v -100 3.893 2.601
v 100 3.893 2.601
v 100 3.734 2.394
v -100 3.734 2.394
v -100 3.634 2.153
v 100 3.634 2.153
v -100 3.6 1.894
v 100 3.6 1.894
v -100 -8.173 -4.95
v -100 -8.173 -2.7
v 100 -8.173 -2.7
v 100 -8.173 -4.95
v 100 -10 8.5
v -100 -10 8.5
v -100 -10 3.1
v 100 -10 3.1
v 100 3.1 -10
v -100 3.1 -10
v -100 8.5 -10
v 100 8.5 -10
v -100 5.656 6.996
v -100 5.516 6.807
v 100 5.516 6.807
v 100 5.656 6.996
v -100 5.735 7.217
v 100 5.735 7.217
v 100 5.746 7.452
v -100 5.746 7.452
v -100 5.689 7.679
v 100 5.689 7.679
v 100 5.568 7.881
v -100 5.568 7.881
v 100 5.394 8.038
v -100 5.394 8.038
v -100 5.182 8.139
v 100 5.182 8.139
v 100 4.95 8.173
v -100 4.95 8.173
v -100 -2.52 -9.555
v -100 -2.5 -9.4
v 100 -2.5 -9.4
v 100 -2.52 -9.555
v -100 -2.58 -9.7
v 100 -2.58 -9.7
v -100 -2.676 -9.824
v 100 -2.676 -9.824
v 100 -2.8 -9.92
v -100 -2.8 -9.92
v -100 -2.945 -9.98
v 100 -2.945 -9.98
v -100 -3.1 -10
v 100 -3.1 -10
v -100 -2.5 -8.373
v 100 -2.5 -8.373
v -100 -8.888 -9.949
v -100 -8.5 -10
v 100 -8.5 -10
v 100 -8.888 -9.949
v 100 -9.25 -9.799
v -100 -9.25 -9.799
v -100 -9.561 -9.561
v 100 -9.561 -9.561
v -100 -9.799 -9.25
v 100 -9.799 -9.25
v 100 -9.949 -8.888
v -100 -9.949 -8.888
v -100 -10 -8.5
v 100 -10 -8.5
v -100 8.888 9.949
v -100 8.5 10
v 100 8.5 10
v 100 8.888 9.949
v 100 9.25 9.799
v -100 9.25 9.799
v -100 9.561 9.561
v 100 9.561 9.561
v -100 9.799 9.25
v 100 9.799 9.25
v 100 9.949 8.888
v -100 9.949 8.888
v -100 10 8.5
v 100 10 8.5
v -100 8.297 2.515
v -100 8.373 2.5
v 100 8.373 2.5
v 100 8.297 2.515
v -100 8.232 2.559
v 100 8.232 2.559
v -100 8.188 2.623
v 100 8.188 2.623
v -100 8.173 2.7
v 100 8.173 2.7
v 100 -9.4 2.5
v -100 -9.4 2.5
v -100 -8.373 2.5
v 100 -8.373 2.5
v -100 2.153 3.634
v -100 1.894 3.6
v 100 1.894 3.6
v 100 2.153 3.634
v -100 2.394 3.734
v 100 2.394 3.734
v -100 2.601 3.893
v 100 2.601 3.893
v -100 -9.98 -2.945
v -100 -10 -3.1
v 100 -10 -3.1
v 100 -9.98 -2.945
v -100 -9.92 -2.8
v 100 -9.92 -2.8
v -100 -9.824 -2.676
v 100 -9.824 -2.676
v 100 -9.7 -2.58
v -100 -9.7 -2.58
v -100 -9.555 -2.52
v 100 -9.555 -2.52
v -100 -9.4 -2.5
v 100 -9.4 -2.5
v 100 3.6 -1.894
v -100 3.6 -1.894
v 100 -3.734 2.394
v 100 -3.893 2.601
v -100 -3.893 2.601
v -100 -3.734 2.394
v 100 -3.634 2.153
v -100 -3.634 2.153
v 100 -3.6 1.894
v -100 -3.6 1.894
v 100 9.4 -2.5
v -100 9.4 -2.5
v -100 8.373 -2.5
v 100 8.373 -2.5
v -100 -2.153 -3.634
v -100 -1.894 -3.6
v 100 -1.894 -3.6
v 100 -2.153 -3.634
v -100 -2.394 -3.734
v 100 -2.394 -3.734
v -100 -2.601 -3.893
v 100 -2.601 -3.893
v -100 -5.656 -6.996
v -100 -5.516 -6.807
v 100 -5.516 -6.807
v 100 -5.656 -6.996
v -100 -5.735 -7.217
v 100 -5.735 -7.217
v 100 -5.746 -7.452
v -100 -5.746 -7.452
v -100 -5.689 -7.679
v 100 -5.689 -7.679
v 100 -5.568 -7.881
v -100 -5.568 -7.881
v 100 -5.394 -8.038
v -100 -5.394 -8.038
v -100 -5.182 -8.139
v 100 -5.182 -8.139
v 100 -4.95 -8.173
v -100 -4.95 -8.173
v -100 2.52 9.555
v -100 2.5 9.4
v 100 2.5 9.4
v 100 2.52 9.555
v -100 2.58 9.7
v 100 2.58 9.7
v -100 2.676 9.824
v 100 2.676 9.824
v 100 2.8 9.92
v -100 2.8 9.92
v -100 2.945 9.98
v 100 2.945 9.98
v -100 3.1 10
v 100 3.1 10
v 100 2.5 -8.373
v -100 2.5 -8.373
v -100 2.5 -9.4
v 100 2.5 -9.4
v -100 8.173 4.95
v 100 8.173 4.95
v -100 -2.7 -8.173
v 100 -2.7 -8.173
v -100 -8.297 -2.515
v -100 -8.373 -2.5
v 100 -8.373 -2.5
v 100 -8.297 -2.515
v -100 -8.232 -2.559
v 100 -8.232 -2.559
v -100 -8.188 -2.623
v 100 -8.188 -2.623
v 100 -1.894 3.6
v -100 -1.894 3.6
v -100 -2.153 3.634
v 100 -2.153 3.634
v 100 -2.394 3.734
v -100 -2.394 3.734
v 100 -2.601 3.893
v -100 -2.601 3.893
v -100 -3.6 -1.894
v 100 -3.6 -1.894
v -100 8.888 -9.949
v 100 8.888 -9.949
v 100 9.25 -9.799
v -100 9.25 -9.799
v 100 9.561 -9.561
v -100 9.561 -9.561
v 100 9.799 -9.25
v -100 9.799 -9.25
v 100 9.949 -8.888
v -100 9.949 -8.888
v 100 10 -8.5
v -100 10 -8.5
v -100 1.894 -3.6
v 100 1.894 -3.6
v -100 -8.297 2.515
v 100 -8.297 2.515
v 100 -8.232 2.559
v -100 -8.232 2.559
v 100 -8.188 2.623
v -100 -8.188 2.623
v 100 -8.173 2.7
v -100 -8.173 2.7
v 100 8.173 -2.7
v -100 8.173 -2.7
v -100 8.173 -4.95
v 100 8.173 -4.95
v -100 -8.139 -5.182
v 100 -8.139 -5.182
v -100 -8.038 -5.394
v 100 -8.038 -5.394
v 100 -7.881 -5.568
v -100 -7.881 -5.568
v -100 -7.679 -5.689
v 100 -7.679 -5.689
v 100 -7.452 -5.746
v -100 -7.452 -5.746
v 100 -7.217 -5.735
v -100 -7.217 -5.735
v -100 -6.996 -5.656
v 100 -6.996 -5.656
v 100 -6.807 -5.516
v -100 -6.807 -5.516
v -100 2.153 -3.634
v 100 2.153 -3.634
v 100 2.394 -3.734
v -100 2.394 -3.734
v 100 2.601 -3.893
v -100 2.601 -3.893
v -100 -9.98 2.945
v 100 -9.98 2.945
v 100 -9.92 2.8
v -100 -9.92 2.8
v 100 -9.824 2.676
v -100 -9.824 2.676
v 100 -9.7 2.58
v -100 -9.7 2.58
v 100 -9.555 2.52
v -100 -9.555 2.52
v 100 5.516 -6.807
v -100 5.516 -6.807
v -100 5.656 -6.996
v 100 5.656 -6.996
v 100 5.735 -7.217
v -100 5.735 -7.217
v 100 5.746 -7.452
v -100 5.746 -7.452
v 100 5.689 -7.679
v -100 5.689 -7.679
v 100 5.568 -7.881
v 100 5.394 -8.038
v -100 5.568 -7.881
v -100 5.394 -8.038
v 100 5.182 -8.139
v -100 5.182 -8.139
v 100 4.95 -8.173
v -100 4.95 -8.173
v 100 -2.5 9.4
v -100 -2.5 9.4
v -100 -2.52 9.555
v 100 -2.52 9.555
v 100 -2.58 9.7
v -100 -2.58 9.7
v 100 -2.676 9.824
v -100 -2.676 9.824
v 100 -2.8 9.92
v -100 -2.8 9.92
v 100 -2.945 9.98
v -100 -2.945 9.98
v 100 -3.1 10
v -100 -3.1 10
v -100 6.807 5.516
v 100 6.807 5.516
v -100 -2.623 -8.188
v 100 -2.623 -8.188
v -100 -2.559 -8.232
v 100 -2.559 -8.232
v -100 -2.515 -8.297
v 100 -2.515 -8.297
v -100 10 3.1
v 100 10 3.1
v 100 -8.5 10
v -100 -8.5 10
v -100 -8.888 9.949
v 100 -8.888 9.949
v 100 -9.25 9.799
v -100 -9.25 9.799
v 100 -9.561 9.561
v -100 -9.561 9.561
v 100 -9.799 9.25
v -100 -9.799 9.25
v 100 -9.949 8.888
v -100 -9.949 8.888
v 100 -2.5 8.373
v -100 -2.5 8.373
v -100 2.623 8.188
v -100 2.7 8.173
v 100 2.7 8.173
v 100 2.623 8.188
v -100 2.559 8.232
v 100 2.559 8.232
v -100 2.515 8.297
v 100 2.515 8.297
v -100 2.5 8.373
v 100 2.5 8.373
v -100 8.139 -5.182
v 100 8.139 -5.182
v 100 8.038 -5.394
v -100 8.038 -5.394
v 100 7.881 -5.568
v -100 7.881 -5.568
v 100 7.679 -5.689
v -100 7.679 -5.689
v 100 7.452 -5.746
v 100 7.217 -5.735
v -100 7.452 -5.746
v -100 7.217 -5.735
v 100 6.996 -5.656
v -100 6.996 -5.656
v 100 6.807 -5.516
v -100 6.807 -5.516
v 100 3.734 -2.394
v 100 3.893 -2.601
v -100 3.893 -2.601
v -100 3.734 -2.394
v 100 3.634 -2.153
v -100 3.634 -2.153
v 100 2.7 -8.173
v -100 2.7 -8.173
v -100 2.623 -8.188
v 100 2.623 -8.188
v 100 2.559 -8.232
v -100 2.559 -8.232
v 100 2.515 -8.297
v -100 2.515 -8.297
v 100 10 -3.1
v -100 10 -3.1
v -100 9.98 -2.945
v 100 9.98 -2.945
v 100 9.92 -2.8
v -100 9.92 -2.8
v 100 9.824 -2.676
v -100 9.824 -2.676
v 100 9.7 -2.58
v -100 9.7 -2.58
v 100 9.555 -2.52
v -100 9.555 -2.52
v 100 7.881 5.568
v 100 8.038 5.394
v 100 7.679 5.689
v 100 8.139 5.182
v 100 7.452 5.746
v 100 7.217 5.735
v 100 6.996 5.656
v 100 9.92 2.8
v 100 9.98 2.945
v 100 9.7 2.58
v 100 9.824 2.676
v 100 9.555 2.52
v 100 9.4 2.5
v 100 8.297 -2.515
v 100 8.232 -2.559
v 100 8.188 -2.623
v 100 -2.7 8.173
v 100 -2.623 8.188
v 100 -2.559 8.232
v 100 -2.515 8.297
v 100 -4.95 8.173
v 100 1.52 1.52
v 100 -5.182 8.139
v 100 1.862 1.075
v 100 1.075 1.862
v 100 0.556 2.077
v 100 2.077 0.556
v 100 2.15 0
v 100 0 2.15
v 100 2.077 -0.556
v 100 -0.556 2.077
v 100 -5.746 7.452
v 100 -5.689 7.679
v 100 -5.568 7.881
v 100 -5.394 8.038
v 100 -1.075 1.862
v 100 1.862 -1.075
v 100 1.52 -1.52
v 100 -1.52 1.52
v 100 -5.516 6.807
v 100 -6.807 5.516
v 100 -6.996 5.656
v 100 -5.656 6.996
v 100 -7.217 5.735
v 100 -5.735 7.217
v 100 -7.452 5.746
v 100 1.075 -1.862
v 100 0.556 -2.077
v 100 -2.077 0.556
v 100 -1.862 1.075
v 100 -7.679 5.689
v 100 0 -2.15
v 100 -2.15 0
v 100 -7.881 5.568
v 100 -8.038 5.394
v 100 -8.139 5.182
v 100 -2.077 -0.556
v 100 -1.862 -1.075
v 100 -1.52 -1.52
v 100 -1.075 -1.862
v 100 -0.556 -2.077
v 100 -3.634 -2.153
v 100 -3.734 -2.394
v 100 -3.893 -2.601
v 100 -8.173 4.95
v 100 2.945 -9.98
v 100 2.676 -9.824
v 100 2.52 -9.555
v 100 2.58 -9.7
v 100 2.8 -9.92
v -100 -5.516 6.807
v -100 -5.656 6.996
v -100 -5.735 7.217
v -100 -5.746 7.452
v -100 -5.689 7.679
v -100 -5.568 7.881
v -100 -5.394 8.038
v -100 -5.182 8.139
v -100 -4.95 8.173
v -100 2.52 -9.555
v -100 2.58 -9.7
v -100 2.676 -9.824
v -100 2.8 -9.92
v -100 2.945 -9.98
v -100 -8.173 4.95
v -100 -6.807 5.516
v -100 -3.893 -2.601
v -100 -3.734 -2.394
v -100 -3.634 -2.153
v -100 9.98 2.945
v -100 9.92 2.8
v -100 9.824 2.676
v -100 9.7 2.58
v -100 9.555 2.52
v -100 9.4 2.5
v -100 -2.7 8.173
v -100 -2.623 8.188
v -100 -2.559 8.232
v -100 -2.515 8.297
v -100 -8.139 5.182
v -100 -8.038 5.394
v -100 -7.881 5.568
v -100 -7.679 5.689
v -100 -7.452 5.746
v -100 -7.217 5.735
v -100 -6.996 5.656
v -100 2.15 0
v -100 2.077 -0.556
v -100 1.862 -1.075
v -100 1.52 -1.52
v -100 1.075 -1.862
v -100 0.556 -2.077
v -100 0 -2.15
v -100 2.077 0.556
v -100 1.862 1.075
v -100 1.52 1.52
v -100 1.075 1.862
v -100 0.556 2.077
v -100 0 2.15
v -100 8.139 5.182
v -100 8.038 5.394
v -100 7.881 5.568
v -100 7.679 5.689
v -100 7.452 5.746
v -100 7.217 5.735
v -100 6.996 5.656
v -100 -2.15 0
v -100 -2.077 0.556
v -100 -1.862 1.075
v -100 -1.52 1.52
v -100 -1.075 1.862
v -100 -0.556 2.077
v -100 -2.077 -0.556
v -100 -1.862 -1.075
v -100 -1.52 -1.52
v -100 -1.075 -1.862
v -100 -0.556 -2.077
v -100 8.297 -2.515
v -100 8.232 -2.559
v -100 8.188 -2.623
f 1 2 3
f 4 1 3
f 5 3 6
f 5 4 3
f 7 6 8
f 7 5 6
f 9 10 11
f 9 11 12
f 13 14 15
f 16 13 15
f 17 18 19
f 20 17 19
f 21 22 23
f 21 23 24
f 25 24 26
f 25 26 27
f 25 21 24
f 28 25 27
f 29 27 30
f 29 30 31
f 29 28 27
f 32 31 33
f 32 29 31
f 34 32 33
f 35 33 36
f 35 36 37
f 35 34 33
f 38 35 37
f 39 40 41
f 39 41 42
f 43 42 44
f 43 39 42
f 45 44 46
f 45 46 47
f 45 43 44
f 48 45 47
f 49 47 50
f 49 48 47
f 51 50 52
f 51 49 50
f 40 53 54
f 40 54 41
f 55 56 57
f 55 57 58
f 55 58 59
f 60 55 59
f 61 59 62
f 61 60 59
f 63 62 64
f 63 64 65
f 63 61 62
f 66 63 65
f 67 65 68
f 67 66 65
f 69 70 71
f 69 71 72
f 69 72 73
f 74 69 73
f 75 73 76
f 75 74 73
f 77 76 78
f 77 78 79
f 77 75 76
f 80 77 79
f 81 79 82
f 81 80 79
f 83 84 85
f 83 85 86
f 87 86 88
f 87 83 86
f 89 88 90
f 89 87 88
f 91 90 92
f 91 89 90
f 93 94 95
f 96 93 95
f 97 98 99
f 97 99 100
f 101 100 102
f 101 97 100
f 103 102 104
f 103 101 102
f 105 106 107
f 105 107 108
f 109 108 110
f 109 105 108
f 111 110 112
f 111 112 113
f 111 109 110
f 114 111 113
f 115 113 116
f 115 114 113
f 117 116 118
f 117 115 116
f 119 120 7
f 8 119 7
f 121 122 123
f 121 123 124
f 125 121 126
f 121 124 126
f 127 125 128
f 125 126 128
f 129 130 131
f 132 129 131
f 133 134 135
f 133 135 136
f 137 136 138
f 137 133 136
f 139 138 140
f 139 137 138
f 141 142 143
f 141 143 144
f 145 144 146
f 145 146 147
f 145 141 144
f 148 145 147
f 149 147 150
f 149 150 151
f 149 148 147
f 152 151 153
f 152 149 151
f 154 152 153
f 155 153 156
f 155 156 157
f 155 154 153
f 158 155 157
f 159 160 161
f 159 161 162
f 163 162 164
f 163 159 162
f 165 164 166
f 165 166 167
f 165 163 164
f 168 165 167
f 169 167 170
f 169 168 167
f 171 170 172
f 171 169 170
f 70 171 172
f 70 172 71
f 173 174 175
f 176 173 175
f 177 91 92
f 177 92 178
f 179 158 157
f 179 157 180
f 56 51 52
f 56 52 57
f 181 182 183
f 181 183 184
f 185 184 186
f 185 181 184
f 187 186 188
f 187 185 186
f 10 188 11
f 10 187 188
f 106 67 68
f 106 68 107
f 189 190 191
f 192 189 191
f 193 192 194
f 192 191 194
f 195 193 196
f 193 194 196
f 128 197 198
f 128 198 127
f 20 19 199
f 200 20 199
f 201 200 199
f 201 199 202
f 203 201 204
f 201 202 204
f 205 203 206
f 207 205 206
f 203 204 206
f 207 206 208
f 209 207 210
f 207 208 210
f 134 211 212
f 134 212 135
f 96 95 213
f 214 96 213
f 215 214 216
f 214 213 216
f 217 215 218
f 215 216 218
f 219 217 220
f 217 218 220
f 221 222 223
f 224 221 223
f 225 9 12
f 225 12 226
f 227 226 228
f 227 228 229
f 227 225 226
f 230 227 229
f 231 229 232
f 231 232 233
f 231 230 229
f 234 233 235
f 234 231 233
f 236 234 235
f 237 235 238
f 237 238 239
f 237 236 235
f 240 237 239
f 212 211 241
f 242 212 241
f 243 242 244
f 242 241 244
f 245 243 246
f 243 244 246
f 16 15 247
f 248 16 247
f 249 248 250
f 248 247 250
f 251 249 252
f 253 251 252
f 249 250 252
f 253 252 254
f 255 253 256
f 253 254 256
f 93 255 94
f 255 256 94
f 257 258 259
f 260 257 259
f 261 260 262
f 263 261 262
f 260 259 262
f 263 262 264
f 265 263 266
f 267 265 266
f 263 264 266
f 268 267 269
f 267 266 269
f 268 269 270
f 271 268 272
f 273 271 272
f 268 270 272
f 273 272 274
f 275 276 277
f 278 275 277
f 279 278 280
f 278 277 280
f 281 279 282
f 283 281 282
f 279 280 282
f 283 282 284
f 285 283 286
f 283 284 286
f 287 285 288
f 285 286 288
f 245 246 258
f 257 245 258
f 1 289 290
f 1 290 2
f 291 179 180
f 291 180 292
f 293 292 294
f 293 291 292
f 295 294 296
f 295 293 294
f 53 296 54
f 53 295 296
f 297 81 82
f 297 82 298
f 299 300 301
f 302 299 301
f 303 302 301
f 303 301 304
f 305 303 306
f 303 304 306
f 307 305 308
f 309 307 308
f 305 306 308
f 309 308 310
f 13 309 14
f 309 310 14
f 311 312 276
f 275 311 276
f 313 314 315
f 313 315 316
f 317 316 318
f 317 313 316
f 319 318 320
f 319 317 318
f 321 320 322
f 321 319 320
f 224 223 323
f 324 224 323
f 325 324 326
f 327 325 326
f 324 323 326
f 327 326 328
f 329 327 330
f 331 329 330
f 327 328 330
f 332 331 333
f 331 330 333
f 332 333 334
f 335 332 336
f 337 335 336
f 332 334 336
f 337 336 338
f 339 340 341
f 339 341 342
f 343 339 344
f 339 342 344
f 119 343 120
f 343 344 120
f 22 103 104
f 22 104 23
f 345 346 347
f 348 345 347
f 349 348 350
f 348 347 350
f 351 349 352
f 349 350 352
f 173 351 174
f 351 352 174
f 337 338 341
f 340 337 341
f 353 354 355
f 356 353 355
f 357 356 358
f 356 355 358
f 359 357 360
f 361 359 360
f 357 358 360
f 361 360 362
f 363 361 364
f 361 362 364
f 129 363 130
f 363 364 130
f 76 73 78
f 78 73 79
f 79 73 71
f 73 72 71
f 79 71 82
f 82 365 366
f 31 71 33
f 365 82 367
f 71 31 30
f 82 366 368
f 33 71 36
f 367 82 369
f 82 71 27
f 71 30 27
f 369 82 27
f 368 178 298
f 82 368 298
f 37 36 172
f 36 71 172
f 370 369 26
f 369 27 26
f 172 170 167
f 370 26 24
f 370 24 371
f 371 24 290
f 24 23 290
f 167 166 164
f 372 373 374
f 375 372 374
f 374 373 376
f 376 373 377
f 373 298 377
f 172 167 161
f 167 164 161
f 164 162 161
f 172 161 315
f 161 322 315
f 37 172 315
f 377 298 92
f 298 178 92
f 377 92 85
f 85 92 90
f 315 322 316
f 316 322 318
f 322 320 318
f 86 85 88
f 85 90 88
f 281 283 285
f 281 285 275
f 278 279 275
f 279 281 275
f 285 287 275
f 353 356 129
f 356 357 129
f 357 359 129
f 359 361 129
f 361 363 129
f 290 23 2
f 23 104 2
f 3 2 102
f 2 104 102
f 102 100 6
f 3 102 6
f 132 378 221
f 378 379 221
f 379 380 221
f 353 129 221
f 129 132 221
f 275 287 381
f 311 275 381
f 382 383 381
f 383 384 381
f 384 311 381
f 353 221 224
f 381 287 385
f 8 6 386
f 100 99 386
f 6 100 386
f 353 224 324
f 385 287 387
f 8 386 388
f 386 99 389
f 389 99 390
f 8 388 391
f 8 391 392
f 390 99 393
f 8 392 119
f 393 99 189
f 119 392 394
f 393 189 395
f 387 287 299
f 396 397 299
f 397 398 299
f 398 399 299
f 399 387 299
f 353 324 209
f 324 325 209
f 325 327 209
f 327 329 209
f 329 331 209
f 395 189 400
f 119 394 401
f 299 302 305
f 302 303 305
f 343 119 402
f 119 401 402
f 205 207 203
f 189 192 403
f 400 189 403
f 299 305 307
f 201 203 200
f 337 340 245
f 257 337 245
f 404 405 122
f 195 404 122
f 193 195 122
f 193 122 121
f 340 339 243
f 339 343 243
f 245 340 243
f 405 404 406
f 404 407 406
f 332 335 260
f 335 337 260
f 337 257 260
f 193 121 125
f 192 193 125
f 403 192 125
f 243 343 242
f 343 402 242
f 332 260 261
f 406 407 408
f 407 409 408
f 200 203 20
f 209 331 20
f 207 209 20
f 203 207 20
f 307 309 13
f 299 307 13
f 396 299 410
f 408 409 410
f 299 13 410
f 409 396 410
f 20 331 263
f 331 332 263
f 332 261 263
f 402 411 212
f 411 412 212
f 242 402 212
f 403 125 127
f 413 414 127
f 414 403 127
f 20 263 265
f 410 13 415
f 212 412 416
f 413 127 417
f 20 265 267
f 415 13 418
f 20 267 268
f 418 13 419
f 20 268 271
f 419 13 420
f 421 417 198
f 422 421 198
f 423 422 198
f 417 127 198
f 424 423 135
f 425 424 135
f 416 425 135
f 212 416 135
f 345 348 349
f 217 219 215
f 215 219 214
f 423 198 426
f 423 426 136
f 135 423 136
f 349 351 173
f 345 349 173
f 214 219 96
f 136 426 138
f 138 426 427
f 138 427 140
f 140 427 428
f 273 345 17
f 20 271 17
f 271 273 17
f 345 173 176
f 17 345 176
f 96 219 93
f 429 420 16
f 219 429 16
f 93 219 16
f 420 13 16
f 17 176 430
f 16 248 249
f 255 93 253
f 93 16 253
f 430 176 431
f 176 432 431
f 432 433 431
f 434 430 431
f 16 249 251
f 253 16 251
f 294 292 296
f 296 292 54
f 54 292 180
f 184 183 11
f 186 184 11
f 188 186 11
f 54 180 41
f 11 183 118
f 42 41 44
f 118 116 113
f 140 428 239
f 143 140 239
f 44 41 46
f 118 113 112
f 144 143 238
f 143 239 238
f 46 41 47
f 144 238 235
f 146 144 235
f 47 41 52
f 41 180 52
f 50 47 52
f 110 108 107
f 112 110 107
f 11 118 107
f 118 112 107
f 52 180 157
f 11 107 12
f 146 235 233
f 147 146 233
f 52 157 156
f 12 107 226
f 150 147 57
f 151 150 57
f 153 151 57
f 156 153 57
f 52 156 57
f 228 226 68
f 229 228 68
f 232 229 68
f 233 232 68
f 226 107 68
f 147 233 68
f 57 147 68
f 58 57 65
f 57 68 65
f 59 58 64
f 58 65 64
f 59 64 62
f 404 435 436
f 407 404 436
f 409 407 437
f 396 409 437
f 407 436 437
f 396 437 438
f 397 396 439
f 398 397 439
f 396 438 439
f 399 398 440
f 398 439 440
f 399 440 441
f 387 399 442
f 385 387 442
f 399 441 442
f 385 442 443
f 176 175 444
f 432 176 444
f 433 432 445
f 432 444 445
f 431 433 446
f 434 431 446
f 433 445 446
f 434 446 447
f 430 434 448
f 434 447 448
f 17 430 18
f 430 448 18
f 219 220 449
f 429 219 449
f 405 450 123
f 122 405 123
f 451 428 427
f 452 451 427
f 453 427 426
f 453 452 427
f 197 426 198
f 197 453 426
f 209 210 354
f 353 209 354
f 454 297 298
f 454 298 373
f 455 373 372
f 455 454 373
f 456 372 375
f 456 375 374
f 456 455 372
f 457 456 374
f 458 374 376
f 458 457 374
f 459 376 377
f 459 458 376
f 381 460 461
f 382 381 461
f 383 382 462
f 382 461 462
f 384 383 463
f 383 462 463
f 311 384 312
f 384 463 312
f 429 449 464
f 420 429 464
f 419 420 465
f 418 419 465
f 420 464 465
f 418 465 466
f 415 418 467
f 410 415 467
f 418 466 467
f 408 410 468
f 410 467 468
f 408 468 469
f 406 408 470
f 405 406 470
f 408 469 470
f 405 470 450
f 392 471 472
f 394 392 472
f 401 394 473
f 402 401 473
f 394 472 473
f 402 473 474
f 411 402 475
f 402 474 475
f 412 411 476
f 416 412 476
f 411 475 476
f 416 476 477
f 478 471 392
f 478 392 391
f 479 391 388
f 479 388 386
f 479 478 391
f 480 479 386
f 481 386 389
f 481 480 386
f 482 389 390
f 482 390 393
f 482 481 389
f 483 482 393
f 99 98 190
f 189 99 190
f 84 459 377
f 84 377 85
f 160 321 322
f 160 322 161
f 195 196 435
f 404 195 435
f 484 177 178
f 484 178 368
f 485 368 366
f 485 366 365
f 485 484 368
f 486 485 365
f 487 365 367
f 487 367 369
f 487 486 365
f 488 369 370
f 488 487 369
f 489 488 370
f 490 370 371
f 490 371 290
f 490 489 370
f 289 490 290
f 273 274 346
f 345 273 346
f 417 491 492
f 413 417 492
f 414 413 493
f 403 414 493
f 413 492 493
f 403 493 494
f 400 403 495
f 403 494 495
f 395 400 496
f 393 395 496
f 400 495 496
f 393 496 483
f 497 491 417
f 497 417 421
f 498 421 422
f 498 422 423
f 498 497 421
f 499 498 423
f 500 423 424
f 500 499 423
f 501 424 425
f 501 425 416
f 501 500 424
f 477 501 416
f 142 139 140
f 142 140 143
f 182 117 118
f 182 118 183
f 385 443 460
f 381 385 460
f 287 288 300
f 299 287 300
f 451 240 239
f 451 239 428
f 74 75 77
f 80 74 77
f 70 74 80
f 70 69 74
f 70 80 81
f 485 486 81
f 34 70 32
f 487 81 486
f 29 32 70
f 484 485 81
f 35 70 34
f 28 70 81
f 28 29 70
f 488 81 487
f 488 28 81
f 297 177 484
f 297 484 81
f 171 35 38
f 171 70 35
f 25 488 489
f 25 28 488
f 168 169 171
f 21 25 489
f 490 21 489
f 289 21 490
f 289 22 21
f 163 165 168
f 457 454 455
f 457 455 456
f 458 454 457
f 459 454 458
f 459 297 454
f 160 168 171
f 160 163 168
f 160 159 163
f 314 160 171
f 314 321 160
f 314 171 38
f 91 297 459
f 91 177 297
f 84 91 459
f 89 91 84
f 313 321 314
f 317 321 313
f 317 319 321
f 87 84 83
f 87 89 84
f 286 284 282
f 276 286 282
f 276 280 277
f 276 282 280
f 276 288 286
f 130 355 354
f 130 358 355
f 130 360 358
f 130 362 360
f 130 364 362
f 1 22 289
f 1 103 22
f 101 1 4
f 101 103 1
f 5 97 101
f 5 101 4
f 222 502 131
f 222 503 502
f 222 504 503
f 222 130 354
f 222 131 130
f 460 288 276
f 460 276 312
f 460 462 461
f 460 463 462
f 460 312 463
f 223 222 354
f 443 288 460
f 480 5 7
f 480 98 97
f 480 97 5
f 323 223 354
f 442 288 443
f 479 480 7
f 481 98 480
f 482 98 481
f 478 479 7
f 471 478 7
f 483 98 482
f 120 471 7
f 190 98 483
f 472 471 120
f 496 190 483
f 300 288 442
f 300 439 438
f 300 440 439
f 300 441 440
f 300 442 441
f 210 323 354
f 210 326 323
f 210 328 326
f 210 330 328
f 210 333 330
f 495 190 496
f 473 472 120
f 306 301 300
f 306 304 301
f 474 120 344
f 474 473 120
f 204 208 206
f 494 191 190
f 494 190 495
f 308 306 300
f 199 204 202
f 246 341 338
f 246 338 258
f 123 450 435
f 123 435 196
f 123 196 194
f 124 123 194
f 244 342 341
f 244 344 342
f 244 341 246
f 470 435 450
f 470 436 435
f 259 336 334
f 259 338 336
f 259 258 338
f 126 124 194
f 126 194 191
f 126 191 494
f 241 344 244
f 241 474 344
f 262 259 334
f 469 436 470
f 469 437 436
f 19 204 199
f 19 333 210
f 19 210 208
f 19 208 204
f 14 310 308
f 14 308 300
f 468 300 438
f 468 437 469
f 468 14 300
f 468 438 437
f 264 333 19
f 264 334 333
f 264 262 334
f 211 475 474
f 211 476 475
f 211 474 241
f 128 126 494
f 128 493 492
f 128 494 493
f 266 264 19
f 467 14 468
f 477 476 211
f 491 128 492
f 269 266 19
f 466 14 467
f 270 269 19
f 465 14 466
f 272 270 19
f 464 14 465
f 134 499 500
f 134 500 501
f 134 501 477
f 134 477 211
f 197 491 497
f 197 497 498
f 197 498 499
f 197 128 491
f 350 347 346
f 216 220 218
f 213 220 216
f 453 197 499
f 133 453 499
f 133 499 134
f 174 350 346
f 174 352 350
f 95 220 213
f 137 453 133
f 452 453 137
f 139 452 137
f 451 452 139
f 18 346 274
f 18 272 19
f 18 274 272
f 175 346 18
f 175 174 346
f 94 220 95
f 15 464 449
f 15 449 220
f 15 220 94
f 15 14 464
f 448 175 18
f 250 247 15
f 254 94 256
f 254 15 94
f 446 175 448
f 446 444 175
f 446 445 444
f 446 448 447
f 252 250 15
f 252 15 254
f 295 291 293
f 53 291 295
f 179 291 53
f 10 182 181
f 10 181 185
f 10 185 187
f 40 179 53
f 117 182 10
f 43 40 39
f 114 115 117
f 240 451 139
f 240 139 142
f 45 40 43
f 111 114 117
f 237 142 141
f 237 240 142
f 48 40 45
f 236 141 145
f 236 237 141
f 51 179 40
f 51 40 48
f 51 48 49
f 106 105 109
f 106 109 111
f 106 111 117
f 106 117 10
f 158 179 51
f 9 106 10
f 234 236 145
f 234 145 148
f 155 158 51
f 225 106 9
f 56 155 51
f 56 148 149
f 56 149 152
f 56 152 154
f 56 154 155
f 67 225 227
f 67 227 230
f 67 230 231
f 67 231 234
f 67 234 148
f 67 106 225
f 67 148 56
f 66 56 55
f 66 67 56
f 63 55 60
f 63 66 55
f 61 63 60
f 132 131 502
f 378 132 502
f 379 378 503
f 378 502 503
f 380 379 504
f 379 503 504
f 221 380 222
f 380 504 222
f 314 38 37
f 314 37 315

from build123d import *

# Parameters (mm, degrees)
BOSS_EXTRUDE1_DEPTH      = 100
BOSS_EXTRUDE1_DEPTH_BACK = 100


with BuildPart() as part:
    # Sketch3 → Boss-Extrude1 (new, two sides: drawn at the far end of the back side and taken through both)
    with BuildSketch(Plane(origin=(0, 0, 0), x_dir=(0, 0, -1), z_dir=(1, 0, 0)).offset(-BOSS_EXTRUDE1_DEPTH_BACK)):
        with BuildLine():
            Line((-5.515685425, 6.807463915), (-2.601114729, 3.892893219))
            ThreePointArc((-2.601114729, 3.892893219), (-2.27669138, 3.676120467), (-1.894007948, 3.6))
            Line((-1.894007948, 3.6), (0, 3.6))
            Line((0, 3.6), (0, 2.15))
            ThreePointArc((0, 2.15), (-1.52027958, 1.52027958), (-2.15, 0))
            Line((-2.15, 0), (-3.6, 0))
            Line((-3.6, 0), (-3.6, 1.894007948))
            ThreePointArc((-3.6, 1.894007948), (-3.676120467, 2.27669138), (-3.892893219, 2.601114729))
            Line((-3.892893219, 2.601114729), (-6.807463915, 5.515685425))
            ThreePointArc((-6.807463915, 5.515685425), (-7.679296086, 5.689103626), (-8.17314934, 4.95))
            Line((-8.17314934, 4.95), (-8.17314934, 2.7))
            ThreePointArc((-8.17314934, 2.7), (-8.231727984, 2.558578644), (-8.37314934, 2.5))
            Line((-8.37314934, 2.5), (-9.4, 2.5))
            ThreePointArc((-9.4, 2.5), (-9.824264069, 2.675735931), (-10, 3.1))
            Line((-10, 3.1), (-10, 8.5))
            ThreePointArc((-10, 8.5), (-9.560660172, 9.560660172), (-8.5, 10))
            Line((-8.5, 10), (-3.1, 10))
            ThreePointArc((-3.1, 10), (-2.675735931, 9.824264069), (-2.5, 9.4))
            Line((-2.5, 9.4), (-2.5, 8.37314934))
            ThreePointArc((-2.5, 8.37314934), (-2.558578644, 8.231727984), (-2.7, 8.17314934))
            Line((-2.7, 8.17314934), (-4.95, 8.17314934))
            ThreePointArc((-4.95, 8.17314934), (-5.689103626, 7.679296086), (-5.515685425, 6.807463915))
        make_face()
    extrude(amount=BOSS_EXTRUDE1_DEPTH + BOSS_EXTRUDE1_DEPTH_BACK)

    # Mirror1: part across plane


with BuildPart() as part_1:
    add(part.part)
    add(part.part.mirror(Plane.ZX))

    # Mirror2: part across plane


with BuildPart() as part_2:
    add(part_1.part)
    add(part_1.part.mirror(Plane.XY))


solid = part_2.part
